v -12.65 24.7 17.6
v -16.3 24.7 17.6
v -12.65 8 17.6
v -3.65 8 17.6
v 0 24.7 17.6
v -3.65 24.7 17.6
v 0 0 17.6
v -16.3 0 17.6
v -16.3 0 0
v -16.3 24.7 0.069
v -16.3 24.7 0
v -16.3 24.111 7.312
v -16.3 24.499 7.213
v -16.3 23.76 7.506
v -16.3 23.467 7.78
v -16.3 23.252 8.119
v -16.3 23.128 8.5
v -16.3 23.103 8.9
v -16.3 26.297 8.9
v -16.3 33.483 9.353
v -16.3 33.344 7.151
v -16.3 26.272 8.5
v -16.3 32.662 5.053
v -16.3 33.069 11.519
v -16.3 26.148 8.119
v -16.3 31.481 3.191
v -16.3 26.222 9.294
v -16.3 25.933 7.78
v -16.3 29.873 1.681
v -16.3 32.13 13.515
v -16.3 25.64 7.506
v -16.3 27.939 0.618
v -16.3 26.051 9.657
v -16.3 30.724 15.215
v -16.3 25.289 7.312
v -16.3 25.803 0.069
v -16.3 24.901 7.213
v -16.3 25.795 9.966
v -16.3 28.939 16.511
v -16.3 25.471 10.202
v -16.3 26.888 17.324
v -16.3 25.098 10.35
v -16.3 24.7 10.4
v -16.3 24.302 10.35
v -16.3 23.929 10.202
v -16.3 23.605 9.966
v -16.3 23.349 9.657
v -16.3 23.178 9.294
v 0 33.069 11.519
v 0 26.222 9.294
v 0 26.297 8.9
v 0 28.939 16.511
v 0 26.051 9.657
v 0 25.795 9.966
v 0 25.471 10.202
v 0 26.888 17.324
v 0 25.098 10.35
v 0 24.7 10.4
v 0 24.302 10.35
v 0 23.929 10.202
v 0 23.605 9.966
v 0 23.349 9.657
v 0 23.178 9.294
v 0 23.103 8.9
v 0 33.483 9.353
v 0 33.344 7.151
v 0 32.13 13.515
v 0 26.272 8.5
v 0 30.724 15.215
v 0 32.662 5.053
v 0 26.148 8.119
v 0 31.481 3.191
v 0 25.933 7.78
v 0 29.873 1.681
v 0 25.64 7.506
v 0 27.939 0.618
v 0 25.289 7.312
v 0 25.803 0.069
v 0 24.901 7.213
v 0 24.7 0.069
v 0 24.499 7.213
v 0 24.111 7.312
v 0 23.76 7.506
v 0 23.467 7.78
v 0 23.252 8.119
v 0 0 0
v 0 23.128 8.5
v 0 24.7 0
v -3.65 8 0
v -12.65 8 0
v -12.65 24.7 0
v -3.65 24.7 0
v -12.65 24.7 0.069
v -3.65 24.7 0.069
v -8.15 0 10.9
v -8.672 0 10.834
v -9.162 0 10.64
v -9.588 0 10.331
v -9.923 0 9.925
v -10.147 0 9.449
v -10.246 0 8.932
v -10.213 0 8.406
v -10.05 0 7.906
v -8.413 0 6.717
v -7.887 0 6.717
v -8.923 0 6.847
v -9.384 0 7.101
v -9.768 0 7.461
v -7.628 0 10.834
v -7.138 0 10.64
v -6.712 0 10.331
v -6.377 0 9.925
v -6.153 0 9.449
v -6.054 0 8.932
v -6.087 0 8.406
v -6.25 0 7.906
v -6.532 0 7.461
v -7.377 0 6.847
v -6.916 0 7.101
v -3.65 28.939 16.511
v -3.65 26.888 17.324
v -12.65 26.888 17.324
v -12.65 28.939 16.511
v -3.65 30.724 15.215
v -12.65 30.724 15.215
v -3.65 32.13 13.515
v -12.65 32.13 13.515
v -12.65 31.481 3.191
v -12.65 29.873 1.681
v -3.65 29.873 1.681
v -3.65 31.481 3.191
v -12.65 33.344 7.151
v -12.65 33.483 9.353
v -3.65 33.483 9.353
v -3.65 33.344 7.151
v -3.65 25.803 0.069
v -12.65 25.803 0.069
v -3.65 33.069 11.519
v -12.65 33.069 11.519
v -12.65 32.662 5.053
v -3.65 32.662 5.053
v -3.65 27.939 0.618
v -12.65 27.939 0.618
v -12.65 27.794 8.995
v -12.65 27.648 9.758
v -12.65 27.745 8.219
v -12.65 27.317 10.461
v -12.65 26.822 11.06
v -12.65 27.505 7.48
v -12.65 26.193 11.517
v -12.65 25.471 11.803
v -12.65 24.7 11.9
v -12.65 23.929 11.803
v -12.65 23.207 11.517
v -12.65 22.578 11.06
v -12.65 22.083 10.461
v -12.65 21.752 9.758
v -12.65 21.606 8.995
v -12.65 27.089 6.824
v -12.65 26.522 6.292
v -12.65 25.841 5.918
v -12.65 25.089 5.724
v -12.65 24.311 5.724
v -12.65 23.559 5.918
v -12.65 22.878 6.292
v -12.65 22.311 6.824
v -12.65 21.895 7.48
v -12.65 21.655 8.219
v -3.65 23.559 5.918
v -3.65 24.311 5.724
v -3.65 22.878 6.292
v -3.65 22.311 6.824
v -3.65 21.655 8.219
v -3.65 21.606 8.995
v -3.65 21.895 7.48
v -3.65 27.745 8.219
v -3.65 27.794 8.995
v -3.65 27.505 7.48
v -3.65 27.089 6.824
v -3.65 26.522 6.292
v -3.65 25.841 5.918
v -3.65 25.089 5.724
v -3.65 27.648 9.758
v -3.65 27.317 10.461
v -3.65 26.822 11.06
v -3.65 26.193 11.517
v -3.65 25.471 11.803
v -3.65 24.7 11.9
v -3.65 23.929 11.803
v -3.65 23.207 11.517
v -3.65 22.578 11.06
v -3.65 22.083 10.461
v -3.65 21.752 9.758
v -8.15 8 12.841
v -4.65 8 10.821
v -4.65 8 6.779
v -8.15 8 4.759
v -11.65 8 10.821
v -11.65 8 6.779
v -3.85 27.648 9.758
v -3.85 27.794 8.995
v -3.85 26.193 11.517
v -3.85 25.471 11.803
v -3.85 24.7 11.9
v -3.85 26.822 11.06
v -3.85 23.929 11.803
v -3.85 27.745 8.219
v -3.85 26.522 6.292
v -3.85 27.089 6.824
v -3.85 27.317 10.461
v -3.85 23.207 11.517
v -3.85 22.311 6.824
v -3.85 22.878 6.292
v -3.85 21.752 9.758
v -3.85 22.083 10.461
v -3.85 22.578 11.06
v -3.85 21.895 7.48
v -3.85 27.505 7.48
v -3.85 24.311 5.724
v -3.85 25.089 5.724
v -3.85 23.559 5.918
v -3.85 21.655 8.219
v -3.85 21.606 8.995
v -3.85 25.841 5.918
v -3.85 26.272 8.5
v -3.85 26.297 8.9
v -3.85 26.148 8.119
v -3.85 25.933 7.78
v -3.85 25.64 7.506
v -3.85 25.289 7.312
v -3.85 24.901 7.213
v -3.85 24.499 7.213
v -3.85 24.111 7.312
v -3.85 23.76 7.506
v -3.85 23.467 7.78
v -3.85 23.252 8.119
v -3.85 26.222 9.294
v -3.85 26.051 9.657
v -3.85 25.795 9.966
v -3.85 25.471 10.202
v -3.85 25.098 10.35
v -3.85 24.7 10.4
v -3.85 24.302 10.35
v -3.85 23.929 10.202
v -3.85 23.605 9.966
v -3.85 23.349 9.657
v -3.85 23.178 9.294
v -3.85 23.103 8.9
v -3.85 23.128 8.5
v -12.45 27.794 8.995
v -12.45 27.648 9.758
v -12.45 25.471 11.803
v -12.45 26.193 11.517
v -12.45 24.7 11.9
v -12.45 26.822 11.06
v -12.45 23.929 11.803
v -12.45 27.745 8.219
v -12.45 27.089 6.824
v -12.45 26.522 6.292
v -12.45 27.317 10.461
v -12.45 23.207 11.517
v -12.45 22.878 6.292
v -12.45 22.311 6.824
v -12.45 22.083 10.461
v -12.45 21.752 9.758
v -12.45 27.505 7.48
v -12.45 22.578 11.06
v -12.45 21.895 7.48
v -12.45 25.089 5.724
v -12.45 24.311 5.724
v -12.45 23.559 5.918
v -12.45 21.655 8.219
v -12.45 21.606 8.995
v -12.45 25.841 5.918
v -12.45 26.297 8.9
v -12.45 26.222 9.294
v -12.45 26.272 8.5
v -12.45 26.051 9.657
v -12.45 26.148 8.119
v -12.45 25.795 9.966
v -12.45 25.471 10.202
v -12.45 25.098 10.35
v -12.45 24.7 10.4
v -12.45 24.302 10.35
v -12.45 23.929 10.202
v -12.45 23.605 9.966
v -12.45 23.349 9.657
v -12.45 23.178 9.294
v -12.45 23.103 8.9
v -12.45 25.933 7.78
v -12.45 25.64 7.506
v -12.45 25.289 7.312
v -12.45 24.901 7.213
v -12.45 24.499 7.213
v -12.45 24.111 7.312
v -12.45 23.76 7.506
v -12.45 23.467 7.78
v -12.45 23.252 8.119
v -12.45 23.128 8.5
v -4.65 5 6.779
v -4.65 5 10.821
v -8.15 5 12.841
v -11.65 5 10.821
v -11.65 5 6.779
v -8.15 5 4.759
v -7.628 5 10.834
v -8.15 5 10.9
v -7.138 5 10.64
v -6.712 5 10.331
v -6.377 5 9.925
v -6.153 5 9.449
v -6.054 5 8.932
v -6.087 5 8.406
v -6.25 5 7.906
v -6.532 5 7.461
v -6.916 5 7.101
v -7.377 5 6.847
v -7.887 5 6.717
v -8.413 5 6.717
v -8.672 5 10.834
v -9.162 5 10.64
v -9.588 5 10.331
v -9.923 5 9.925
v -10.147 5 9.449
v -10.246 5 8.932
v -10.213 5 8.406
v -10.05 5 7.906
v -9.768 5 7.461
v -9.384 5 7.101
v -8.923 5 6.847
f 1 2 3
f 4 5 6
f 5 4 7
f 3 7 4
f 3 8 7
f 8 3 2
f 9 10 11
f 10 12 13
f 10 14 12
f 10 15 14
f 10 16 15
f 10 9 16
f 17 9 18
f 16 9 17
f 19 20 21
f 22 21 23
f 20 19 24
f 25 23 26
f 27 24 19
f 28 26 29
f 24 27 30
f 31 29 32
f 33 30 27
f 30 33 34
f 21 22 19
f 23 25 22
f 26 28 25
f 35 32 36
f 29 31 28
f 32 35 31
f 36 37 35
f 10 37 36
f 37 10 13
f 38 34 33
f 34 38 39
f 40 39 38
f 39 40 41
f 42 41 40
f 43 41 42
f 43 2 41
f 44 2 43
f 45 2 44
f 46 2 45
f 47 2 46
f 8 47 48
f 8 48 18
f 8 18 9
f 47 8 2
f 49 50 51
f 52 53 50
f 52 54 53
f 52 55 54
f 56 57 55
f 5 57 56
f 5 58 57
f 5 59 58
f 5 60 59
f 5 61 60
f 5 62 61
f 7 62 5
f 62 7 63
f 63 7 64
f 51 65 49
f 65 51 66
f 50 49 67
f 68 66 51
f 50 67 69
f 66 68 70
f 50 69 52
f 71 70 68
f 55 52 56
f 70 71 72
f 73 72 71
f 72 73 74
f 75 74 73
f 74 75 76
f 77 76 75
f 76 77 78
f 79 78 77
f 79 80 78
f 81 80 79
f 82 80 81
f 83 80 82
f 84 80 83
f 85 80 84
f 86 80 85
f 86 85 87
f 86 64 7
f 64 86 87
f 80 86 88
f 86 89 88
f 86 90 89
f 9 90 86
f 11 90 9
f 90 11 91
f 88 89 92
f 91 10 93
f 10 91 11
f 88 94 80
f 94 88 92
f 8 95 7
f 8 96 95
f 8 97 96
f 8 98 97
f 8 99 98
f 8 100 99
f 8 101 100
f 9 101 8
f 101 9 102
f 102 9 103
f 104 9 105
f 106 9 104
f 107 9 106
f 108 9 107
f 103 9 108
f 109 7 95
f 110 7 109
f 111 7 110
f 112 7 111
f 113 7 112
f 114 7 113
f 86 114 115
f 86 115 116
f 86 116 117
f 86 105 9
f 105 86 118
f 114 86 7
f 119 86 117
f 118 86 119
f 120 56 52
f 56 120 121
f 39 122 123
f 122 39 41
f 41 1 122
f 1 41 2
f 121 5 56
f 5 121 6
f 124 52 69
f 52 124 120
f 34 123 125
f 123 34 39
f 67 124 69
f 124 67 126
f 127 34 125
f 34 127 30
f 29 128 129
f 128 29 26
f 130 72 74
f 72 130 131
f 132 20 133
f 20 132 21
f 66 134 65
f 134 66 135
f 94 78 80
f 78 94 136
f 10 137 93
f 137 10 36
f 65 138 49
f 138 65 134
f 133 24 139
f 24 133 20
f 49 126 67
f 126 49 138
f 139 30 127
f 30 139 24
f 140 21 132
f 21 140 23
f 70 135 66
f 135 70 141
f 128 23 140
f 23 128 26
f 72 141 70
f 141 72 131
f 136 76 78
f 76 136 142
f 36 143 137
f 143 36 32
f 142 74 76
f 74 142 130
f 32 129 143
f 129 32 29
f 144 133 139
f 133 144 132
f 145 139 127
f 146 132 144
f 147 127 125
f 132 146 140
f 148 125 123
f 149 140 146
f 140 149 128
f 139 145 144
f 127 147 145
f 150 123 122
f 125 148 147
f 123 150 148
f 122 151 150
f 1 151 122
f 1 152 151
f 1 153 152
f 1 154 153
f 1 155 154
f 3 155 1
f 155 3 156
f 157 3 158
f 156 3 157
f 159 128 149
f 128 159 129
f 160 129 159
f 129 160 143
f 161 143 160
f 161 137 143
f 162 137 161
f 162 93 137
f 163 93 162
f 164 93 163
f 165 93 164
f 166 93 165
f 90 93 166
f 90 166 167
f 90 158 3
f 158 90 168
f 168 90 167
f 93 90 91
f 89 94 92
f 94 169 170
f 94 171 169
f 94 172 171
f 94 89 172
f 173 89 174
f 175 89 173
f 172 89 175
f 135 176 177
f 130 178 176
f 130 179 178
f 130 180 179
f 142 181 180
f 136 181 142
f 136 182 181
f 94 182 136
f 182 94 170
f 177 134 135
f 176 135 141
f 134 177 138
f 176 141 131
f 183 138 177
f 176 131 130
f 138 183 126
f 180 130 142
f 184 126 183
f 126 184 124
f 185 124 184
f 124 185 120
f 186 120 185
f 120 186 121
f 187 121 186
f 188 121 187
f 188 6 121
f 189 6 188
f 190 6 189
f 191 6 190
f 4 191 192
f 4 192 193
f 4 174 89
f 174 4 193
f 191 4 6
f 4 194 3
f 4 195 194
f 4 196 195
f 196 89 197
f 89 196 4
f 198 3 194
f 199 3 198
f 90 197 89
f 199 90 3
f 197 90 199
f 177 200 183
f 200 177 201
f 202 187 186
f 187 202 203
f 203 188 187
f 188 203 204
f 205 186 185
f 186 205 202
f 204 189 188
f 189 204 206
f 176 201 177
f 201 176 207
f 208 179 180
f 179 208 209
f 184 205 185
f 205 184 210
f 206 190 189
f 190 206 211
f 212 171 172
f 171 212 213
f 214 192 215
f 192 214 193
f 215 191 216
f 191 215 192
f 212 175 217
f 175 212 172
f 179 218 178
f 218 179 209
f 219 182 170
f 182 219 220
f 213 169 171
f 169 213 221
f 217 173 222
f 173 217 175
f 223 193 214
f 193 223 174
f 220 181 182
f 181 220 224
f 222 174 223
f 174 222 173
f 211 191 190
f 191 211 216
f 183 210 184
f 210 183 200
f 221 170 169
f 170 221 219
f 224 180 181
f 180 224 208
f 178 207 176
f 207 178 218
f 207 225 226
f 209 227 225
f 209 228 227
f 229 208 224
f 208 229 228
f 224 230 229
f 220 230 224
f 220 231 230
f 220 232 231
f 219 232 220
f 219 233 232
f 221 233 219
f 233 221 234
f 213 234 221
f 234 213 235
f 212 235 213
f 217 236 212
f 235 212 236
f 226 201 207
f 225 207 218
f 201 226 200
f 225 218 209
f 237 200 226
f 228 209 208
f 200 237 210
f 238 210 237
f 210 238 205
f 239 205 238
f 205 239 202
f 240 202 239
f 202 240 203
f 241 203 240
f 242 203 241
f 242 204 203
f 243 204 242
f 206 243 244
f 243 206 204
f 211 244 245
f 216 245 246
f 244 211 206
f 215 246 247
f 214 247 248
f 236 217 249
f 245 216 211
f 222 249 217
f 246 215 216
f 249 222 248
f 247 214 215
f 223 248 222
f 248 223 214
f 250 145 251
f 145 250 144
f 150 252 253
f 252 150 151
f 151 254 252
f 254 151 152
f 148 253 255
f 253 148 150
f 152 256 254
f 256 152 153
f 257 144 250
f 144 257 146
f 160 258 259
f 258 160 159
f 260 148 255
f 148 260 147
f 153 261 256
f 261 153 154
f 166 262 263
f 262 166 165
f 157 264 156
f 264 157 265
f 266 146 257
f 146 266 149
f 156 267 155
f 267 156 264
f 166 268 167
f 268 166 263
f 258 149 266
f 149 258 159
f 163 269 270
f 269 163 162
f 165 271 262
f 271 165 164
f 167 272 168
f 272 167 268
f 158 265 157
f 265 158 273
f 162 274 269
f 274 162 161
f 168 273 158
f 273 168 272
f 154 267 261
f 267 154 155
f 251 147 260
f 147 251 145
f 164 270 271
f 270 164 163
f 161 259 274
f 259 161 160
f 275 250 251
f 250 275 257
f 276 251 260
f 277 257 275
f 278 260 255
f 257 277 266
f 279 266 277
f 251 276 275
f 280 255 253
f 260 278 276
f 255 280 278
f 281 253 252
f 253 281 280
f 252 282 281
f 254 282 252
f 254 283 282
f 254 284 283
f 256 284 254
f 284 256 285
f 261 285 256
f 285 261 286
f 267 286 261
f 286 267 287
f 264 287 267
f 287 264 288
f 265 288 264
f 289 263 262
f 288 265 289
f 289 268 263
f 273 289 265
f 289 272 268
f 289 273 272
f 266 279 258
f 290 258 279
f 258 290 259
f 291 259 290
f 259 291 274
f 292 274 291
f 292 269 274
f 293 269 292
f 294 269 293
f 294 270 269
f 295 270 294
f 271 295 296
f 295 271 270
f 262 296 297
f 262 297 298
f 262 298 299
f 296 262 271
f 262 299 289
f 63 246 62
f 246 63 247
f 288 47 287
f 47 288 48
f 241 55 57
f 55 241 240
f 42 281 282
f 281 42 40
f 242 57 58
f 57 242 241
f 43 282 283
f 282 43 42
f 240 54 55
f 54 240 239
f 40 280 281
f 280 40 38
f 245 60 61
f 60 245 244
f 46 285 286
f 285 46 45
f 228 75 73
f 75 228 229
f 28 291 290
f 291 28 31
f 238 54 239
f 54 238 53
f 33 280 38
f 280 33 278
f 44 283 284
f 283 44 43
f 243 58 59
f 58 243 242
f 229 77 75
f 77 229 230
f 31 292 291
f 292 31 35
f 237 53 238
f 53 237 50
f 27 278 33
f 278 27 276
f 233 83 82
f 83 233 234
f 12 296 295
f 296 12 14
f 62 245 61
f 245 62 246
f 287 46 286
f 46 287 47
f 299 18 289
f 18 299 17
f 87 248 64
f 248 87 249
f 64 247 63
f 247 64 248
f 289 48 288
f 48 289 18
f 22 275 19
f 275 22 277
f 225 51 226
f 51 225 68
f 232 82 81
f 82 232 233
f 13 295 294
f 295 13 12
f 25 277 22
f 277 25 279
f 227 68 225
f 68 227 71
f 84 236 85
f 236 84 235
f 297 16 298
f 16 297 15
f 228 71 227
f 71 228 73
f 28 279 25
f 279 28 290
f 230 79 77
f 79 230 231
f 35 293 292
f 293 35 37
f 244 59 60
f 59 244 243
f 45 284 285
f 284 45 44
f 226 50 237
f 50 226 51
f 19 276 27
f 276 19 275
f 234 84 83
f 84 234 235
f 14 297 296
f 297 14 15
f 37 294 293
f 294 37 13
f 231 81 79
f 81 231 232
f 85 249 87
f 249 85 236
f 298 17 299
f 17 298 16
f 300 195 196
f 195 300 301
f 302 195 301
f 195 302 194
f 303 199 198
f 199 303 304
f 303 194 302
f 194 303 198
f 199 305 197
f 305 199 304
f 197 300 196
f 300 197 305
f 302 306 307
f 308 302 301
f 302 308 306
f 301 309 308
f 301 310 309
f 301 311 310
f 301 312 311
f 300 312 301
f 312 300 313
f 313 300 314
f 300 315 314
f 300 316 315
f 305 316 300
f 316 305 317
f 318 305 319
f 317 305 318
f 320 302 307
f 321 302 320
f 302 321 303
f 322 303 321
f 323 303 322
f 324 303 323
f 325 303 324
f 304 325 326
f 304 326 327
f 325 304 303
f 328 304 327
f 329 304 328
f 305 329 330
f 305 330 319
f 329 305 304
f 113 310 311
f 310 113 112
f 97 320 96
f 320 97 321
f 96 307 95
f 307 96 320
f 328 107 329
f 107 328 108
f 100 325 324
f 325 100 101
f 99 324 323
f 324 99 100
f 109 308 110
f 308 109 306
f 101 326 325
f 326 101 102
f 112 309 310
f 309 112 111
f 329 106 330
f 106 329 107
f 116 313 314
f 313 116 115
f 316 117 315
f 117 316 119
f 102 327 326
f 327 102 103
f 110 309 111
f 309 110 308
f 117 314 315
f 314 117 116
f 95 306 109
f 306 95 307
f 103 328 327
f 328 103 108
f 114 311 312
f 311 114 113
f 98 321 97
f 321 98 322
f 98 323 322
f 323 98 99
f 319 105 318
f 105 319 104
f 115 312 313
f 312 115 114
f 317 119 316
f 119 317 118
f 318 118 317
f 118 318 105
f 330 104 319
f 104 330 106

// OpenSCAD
width = 17.6;
height = 33.5;
length = 16.3;
poleWidth = 9;
axisMetric = 3.2;
tensorMetric = 4.2;
tensorHead = 7;
tensorHeadLength = 3;
assWeight = 8;

protoRadius = 1.5;
protoThicknes = 0.2;

radius = width / 2;
cubeHeigh = height - radius;
lateralThicknes = (length - poleWidth) / 2;

$fn = 25;

module nut(metric, length) {
    cylinder(r=metric/sqrt(3), h=length, $fn=6);
}


rotate([0, -90, 0])
difference() {
    union() {
        cube([width, cubeHeigh, length]);
        translate([radius, cubeHeigh, 0])
            cylinder(h=length, r=radius);
    }

    difference() {
        translate([0, assWeight, lateralThicknes])
            cube([width, height, poleWidth]);

        translate([radius, cubeHeigh, lateralThicknes])
            cylinder(h=protoThicknes, d=axisMetric+(2*protoRadius));

        translate([radius, cubeHeigh, length-lateralThicknes-protoThicknes])
            cylinder(h=protoThicknes, d=axisMetric+(2*protoRadius));
    }

    translate([radius, cubeHeigh, 0])
        cylinder(h=length, d=axisMetric);

    translate([width/2, assWeight+1, length/2])
        rotate([90, 0, 0])
            nut(metric = tensorHead, length=tensorHeadLength+1);

    translate([width/2, assWeight, length/2])
        rotate([90, 0, 0])
            cylinder(h=assWeight, d=tensorMetric);
}
